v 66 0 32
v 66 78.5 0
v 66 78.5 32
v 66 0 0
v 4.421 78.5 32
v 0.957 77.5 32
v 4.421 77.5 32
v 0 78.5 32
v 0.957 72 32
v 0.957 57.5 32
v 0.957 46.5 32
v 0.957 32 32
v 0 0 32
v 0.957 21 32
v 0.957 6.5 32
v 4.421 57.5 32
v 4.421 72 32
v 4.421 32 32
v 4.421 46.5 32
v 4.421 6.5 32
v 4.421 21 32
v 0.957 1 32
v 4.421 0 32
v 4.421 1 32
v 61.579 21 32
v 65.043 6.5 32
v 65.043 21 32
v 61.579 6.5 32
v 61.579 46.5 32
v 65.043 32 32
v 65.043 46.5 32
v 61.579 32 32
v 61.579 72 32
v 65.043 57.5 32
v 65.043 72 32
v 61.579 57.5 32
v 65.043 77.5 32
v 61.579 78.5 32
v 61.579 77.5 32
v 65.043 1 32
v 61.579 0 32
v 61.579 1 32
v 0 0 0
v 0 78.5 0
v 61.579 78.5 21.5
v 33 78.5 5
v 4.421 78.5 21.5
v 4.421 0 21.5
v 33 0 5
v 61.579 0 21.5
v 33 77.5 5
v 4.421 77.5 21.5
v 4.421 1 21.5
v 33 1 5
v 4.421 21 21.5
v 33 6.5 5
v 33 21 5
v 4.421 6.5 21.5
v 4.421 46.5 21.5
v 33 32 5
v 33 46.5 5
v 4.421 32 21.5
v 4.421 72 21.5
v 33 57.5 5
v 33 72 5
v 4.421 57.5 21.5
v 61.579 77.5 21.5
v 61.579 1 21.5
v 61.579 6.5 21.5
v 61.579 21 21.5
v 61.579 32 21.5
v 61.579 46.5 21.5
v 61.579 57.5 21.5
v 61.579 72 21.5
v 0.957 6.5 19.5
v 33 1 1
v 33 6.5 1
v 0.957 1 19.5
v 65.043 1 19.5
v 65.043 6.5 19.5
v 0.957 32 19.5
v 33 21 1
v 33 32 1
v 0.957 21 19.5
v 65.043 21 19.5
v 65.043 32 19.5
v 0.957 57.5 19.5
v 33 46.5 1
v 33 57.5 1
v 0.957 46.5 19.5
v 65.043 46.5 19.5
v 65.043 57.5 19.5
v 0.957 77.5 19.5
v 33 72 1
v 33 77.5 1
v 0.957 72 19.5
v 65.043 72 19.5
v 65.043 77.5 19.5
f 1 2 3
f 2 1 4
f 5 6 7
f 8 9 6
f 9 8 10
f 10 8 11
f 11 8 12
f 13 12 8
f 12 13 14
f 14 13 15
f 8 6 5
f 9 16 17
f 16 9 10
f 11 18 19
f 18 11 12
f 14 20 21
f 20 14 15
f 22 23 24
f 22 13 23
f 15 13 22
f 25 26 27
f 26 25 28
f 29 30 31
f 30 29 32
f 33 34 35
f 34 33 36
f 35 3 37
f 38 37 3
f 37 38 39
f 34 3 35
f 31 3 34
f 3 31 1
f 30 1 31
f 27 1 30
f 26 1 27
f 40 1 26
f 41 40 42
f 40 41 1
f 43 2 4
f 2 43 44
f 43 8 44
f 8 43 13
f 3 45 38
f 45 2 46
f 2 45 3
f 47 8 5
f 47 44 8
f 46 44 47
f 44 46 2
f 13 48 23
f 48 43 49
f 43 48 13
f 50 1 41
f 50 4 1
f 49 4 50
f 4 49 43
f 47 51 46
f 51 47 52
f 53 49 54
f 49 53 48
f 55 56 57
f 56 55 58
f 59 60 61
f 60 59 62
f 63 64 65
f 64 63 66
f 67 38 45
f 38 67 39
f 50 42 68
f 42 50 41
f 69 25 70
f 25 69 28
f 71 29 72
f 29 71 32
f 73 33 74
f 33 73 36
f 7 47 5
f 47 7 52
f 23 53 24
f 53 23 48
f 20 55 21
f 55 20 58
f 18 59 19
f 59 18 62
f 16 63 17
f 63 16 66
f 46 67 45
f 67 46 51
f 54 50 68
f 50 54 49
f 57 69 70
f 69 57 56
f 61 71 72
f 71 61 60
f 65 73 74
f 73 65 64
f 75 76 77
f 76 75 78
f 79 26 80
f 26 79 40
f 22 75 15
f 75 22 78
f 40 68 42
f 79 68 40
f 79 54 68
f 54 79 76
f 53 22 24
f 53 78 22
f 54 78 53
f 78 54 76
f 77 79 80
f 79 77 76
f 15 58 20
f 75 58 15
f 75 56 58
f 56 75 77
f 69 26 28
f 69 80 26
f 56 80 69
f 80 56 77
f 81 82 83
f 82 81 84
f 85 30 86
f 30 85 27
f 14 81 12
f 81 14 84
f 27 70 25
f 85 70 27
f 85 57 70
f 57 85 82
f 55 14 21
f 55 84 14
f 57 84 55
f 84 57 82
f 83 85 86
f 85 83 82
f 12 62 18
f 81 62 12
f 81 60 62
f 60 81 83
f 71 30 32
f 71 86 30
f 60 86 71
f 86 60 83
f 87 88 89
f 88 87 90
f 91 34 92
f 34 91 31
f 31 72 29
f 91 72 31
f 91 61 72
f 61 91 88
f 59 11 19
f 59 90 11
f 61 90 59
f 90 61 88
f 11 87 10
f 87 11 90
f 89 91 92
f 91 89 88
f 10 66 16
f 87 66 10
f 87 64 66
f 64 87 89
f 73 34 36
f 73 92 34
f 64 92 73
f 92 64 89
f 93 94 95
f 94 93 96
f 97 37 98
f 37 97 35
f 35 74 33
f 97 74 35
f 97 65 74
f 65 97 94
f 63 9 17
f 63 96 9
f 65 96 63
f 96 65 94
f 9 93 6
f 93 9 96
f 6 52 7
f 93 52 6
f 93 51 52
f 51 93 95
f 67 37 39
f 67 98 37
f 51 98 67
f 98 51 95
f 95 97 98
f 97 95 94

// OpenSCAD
$fn=200;
THICK = 1;

TILE_L = 20;
TILE_COUNT = 6;

BOX_W = 64;
BOX_L = 76.5; //75.5;
BOX_H = 32;

difference() {
    cube(size = [
        BOX_W + (THICK * 2),
        BOX_L + (THICK * 2), 
        BOX_H]);

    translate([33, -5, 38])
        rotate([0, 90, 90]) 
            cylinder(h = 200, r = 33, $fn=6);

    tile_slot(1);
    tile_slot(1 + TILE_L);

    tile_slot(6.5 + TILE_L);
    tile_slot(6.5 + (TILE_L * 2));

    tile_slot(12 + (TILE_L * 2));
    tile_slot(12 + (TILE_L * 3));

    // tile_slot(17.5 + (TILE_L * 3));
    // tile_slot(17.5 + (TILE_L * 4));
}

module tile_slot(y) {
    translate([33, y, 38])
        rotate([0, 90, 90]) 
            cylinder(h = 5.5, r = 37, $fn=6);
}
